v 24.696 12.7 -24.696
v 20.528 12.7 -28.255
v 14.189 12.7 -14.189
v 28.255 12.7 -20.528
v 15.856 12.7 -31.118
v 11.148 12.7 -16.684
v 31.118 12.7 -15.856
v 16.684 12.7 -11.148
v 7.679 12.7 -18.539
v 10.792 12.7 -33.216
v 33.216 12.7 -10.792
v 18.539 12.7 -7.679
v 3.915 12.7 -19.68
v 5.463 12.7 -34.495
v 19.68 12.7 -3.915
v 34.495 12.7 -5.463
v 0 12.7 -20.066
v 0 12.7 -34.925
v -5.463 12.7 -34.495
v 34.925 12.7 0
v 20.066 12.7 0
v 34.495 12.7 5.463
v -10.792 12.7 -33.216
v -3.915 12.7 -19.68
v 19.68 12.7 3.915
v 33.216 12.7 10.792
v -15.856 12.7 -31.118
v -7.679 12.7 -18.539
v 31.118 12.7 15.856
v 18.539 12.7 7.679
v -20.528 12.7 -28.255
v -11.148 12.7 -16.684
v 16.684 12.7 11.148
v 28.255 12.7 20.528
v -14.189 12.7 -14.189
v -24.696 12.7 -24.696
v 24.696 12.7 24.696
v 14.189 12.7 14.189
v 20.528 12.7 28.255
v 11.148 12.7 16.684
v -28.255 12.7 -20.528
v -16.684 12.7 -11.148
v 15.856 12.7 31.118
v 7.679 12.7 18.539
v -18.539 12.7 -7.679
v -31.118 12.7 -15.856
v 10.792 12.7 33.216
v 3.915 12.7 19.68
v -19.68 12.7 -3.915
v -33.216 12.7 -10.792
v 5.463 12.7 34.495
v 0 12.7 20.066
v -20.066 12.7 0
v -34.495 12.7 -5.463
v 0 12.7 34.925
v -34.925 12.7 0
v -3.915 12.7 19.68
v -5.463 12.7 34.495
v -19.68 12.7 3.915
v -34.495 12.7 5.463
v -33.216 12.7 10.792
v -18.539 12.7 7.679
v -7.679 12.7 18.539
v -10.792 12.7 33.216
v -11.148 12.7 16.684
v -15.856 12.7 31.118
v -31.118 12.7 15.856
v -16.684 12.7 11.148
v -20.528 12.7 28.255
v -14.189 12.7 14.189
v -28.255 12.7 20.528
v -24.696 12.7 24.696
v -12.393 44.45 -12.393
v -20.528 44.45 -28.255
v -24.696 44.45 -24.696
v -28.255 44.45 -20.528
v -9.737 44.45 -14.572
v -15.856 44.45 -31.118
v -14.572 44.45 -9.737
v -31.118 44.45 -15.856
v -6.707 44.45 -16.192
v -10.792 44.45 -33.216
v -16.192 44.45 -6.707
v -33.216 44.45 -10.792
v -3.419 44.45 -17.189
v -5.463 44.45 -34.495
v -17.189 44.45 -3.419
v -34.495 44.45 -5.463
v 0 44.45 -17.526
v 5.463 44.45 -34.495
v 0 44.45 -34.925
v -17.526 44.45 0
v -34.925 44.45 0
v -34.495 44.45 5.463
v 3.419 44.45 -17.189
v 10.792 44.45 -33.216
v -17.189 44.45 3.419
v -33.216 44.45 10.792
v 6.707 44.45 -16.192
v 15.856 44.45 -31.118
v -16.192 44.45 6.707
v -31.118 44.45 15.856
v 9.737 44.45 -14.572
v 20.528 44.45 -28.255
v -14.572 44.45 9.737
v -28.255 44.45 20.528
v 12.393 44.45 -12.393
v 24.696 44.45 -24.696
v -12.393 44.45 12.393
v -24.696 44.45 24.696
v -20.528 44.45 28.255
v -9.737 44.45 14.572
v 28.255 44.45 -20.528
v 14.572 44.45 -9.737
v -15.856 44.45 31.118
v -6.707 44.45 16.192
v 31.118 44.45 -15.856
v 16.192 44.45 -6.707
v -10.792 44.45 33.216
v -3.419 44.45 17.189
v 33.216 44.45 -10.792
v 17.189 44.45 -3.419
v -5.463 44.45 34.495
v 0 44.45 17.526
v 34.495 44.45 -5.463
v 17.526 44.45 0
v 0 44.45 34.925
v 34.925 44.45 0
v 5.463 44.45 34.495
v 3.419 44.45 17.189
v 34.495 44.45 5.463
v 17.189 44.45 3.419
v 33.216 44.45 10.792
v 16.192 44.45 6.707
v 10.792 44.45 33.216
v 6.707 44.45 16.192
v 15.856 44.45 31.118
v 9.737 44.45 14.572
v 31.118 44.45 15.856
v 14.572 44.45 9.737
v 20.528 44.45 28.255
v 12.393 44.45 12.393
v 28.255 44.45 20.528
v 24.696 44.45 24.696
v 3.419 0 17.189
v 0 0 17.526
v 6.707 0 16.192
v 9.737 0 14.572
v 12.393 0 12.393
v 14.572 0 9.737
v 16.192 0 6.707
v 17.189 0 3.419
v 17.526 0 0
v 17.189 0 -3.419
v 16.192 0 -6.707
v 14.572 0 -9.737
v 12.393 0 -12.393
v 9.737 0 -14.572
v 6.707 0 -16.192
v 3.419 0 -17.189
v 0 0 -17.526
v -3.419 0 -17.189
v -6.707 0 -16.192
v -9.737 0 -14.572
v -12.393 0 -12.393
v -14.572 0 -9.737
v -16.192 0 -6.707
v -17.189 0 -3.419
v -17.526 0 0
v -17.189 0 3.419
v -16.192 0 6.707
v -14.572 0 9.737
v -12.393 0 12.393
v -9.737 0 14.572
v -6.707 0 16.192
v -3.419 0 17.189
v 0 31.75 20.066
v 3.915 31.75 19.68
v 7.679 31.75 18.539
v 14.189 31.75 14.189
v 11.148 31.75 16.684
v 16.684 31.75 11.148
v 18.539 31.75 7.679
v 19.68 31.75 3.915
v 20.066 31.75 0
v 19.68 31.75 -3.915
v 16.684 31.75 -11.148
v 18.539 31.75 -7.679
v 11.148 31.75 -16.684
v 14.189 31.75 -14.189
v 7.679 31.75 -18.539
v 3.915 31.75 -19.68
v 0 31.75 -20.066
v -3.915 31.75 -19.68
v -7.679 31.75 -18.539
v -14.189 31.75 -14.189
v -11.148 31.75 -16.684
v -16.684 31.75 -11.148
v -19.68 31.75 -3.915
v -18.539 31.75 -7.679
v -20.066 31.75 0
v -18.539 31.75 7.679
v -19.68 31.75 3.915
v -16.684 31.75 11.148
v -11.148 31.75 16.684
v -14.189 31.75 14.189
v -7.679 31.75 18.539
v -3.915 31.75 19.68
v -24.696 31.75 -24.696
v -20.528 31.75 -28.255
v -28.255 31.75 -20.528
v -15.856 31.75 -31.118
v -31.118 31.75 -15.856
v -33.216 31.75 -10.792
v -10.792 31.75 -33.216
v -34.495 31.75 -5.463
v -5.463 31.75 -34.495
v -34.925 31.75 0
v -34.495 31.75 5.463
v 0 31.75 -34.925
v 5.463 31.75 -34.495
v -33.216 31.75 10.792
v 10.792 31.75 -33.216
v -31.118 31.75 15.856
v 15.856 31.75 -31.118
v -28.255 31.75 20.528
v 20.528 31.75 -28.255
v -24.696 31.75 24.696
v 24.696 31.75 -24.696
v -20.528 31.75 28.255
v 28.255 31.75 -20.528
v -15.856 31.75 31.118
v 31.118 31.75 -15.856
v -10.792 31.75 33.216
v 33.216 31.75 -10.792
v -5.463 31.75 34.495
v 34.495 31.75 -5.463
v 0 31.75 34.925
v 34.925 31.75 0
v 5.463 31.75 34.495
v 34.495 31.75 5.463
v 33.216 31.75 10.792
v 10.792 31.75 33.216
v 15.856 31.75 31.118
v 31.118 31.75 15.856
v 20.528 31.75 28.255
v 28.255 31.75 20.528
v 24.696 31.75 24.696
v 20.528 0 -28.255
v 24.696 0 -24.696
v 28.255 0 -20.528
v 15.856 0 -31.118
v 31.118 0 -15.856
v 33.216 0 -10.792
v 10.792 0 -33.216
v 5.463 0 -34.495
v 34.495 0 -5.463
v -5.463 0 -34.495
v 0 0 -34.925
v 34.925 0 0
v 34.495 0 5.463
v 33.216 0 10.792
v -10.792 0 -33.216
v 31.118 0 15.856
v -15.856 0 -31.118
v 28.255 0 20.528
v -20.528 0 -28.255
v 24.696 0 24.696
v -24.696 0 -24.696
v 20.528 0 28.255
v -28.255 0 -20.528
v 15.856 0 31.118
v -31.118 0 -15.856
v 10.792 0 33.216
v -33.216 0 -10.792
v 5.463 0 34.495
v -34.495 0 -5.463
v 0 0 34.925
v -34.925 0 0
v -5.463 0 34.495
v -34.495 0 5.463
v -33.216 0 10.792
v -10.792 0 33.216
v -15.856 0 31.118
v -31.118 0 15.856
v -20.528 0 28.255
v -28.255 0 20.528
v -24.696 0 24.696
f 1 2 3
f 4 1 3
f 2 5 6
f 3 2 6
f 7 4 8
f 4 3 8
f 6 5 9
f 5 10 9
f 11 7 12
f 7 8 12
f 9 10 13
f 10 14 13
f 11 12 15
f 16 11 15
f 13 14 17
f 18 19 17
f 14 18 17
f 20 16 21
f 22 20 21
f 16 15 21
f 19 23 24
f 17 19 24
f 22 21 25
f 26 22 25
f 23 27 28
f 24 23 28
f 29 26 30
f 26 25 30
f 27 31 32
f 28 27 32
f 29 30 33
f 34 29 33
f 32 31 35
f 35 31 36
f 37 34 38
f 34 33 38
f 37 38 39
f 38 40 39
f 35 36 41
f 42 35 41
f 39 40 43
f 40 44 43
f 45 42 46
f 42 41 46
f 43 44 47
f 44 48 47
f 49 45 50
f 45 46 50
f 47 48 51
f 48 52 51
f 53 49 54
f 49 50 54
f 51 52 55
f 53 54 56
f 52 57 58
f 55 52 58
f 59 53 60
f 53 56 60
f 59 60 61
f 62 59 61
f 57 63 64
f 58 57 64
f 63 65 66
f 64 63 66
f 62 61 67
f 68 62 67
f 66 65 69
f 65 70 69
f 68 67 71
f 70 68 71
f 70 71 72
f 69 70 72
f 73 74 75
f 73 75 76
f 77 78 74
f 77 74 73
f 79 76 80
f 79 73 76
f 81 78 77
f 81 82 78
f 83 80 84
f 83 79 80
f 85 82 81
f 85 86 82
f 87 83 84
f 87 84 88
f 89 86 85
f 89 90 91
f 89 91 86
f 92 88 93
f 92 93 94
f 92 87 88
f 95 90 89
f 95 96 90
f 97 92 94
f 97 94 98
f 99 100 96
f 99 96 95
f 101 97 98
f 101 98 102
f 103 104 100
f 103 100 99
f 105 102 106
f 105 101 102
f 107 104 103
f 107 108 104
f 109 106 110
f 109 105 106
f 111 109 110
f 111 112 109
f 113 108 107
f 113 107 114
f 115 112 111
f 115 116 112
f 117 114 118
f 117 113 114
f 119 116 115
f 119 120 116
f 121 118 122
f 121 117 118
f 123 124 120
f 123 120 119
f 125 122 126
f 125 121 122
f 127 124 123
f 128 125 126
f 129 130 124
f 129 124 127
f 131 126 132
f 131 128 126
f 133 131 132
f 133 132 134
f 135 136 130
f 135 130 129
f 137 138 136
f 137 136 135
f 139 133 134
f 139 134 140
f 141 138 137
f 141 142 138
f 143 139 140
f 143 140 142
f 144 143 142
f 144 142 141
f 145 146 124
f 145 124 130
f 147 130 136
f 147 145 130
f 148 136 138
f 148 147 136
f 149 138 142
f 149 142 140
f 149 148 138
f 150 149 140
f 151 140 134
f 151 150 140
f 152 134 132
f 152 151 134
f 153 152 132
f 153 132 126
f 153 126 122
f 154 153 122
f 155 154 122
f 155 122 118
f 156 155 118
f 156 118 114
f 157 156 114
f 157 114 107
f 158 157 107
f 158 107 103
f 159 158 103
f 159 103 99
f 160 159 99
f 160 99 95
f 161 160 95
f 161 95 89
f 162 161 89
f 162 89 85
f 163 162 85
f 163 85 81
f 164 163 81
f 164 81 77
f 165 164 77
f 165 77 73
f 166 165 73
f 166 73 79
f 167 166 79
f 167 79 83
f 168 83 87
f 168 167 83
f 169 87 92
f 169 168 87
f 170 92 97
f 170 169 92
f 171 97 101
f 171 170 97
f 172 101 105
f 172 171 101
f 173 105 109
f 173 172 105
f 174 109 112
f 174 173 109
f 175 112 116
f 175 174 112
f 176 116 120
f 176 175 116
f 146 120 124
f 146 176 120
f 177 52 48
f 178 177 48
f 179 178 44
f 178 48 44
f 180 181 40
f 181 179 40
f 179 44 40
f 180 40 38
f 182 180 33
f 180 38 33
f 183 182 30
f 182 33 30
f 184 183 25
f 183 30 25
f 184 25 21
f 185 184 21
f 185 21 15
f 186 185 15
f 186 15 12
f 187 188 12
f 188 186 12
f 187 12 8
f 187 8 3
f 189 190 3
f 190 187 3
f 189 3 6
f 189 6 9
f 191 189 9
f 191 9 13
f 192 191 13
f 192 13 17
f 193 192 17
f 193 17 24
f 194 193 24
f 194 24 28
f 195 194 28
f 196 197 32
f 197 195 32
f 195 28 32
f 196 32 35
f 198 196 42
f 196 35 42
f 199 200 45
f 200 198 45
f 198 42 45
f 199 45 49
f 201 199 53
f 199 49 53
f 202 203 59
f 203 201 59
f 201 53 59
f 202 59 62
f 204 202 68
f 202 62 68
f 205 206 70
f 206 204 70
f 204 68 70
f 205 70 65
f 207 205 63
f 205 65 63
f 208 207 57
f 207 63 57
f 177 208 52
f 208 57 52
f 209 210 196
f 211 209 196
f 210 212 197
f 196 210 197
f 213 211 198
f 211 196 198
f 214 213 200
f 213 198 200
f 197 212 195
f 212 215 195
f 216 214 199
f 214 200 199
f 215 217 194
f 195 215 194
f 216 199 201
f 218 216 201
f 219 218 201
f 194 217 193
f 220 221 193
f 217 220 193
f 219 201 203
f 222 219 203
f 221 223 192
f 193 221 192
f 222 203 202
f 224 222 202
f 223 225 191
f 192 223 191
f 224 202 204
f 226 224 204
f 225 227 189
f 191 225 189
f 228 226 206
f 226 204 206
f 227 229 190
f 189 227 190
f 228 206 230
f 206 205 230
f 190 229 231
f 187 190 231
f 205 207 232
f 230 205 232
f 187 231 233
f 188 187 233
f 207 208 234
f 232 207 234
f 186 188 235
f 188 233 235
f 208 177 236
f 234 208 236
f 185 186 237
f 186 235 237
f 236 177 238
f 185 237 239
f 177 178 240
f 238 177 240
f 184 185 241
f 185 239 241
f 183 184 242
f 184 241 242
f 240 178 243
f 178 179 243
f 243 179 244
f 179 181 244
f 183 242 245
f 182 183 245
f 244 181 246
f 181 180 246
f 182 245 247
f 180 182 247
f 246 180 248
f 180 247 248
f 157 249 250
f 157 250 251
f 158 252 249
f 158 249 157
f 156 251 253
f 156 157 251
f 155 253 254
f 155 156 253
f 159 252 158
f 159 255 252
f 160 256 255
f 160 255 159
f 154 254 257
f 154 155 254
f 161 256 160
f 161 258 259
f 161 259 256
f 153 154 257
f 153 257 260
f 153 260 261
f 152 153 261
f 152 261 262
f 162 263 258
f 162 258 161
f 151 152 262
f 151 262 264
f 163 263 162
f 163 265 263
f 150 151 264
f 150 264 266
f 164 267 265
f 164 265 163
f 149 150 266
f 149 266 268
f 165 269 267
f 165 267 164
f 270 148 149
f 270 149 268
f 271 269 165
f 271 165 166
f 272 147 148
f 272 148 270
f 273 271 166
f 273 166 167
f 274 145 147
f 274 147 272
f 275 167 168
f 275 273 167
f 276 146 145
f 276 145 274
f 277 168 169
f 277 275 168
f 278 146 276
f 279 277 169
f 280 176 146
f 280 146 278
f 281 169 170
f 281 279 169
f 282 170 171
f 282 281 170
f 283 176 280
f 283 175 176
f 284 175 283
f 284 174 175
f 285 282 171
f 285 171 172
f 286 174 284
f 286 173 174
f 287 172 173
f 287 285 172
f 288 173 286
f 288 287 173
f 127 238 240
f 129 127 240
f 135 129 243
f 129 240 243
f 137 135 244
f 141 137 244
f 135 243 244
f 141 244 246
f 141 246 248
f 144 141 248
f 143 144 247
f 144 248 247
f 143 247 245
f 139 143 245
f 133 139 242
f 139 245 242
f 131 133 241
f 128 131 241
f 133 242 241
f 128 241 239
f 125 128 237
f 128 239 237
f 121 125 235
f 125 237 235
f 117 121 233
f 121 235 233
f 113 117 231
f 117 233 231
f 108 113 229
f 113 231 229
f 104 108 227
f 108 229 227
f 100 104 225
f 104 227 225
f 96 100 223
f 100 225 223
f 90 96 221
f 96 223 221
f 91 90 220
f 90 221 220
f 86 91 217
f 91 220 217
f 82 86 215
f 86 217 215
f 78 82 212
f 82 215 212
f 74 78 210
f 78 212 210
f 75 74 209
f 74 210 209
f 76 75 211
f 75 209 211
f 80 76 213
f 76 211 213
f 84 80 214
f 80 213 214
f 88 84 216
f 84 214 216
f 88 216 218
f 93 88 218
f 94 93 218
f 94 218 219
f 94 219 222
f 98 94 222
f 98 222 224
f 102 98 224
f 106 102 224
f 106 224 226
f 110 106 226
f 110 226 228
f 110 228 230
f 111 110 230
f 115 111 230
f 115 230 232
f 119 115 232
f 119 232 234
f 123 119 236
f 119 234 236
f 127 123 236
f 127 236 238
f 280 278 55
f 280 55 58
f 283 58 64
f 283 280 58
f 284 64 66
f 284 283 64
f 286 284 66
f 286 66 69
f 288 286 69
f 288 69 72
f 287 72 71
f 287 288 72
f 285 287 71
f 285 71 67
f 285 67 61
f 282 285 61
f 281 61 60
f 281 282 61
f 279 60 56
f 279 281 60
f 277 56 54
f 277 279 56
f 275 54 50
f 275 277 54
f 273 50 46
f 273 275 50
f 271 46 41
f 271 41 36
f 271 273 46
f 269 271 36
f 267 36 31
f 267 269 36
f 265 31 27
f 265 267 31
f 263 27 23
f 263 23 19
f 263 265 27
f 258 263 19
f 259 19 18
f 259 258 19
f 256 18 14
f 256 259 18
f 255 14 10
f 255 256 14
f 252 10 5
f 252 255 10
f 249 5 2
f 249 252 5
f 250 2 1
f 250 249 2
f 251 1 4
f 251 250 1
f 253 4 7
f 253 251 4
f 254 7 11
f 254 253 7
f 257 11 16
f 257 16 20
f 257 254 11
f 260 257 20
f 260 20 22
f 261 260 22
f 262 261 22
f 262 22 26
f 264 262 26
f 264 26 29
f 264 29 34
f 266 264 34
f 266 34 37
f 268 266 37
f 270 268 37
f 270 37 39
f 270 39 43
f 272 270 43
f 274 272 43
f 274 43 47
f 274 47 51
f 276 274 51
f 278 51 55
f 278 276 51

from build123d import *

# Parameters (mm, degrees)
SKETCH1_R      = 20.066
SKETCH1_R_2    = 17.526
EXTRUDE1_DEPTH = 44.45
EXTRUDE2_START = -12.7
SKETCH2_R      = 34.925
SKETCH2_R_2    = 17.526
EXTRUDE2_DEPTH = 12.7
SKETCH3_R      = 34.925
SKETCH3_R_2    = 17.526
EXTRUDE3_DEPTH = 12.7


with BuildPart() as part:
    # Sketch1 → Extrude1 (new body)
    with BuildSketch(Plane(origin=(0, 0, 0), x_dir=(1, 0, 0), z_dir=(0, 1, 0))):
        with Locations(Location((0, 0, 0), (0, 0, 270))):
            Circle(SKETCH1_R)
        with Locations(Location((0, 0, 0), (0, 0, 270))):
            Circle(SKETCH1_R_2, mode=Mode.SUBTRACT)
    extrude(amount=EXTRUDE1_DEPTH)

    # Sketch2 → Extrude2 (add)
    with BuildSketch(Plane(origin=(0, 44.45, 0), x_dir=(1, 0, 0), z_dir=(0, 1, 0)).offset(EXTRUDE2_START)):
        with Locations(Location((0, 0, 0), (0, 0, 270))):
            Circle(SKETCH2_R)
        with Locations(Location((0, 0, 0), (0, 0, 270))):
            Circle(SKETCH2_R_2, mode=Mode.SUBTRACT)
    extrude(amount=EXTRUDE2_DEPTH)

    # Sketch3 → Extrude3 (add)
    with BuildSketch(Plane.XZ):
        with Locations(Location((0, 0, 0), (0, 0, 90))):
            Circle(SKETCH3_R)
        with Locations(Location((0, 0, 0), (0, 0, 90))):
            Circle(SKETCH3_R_2, mode=Mode.SUBTRACT)
    extrude(amount=-EXTRUDE3_DEPTH)


solid = part.part
